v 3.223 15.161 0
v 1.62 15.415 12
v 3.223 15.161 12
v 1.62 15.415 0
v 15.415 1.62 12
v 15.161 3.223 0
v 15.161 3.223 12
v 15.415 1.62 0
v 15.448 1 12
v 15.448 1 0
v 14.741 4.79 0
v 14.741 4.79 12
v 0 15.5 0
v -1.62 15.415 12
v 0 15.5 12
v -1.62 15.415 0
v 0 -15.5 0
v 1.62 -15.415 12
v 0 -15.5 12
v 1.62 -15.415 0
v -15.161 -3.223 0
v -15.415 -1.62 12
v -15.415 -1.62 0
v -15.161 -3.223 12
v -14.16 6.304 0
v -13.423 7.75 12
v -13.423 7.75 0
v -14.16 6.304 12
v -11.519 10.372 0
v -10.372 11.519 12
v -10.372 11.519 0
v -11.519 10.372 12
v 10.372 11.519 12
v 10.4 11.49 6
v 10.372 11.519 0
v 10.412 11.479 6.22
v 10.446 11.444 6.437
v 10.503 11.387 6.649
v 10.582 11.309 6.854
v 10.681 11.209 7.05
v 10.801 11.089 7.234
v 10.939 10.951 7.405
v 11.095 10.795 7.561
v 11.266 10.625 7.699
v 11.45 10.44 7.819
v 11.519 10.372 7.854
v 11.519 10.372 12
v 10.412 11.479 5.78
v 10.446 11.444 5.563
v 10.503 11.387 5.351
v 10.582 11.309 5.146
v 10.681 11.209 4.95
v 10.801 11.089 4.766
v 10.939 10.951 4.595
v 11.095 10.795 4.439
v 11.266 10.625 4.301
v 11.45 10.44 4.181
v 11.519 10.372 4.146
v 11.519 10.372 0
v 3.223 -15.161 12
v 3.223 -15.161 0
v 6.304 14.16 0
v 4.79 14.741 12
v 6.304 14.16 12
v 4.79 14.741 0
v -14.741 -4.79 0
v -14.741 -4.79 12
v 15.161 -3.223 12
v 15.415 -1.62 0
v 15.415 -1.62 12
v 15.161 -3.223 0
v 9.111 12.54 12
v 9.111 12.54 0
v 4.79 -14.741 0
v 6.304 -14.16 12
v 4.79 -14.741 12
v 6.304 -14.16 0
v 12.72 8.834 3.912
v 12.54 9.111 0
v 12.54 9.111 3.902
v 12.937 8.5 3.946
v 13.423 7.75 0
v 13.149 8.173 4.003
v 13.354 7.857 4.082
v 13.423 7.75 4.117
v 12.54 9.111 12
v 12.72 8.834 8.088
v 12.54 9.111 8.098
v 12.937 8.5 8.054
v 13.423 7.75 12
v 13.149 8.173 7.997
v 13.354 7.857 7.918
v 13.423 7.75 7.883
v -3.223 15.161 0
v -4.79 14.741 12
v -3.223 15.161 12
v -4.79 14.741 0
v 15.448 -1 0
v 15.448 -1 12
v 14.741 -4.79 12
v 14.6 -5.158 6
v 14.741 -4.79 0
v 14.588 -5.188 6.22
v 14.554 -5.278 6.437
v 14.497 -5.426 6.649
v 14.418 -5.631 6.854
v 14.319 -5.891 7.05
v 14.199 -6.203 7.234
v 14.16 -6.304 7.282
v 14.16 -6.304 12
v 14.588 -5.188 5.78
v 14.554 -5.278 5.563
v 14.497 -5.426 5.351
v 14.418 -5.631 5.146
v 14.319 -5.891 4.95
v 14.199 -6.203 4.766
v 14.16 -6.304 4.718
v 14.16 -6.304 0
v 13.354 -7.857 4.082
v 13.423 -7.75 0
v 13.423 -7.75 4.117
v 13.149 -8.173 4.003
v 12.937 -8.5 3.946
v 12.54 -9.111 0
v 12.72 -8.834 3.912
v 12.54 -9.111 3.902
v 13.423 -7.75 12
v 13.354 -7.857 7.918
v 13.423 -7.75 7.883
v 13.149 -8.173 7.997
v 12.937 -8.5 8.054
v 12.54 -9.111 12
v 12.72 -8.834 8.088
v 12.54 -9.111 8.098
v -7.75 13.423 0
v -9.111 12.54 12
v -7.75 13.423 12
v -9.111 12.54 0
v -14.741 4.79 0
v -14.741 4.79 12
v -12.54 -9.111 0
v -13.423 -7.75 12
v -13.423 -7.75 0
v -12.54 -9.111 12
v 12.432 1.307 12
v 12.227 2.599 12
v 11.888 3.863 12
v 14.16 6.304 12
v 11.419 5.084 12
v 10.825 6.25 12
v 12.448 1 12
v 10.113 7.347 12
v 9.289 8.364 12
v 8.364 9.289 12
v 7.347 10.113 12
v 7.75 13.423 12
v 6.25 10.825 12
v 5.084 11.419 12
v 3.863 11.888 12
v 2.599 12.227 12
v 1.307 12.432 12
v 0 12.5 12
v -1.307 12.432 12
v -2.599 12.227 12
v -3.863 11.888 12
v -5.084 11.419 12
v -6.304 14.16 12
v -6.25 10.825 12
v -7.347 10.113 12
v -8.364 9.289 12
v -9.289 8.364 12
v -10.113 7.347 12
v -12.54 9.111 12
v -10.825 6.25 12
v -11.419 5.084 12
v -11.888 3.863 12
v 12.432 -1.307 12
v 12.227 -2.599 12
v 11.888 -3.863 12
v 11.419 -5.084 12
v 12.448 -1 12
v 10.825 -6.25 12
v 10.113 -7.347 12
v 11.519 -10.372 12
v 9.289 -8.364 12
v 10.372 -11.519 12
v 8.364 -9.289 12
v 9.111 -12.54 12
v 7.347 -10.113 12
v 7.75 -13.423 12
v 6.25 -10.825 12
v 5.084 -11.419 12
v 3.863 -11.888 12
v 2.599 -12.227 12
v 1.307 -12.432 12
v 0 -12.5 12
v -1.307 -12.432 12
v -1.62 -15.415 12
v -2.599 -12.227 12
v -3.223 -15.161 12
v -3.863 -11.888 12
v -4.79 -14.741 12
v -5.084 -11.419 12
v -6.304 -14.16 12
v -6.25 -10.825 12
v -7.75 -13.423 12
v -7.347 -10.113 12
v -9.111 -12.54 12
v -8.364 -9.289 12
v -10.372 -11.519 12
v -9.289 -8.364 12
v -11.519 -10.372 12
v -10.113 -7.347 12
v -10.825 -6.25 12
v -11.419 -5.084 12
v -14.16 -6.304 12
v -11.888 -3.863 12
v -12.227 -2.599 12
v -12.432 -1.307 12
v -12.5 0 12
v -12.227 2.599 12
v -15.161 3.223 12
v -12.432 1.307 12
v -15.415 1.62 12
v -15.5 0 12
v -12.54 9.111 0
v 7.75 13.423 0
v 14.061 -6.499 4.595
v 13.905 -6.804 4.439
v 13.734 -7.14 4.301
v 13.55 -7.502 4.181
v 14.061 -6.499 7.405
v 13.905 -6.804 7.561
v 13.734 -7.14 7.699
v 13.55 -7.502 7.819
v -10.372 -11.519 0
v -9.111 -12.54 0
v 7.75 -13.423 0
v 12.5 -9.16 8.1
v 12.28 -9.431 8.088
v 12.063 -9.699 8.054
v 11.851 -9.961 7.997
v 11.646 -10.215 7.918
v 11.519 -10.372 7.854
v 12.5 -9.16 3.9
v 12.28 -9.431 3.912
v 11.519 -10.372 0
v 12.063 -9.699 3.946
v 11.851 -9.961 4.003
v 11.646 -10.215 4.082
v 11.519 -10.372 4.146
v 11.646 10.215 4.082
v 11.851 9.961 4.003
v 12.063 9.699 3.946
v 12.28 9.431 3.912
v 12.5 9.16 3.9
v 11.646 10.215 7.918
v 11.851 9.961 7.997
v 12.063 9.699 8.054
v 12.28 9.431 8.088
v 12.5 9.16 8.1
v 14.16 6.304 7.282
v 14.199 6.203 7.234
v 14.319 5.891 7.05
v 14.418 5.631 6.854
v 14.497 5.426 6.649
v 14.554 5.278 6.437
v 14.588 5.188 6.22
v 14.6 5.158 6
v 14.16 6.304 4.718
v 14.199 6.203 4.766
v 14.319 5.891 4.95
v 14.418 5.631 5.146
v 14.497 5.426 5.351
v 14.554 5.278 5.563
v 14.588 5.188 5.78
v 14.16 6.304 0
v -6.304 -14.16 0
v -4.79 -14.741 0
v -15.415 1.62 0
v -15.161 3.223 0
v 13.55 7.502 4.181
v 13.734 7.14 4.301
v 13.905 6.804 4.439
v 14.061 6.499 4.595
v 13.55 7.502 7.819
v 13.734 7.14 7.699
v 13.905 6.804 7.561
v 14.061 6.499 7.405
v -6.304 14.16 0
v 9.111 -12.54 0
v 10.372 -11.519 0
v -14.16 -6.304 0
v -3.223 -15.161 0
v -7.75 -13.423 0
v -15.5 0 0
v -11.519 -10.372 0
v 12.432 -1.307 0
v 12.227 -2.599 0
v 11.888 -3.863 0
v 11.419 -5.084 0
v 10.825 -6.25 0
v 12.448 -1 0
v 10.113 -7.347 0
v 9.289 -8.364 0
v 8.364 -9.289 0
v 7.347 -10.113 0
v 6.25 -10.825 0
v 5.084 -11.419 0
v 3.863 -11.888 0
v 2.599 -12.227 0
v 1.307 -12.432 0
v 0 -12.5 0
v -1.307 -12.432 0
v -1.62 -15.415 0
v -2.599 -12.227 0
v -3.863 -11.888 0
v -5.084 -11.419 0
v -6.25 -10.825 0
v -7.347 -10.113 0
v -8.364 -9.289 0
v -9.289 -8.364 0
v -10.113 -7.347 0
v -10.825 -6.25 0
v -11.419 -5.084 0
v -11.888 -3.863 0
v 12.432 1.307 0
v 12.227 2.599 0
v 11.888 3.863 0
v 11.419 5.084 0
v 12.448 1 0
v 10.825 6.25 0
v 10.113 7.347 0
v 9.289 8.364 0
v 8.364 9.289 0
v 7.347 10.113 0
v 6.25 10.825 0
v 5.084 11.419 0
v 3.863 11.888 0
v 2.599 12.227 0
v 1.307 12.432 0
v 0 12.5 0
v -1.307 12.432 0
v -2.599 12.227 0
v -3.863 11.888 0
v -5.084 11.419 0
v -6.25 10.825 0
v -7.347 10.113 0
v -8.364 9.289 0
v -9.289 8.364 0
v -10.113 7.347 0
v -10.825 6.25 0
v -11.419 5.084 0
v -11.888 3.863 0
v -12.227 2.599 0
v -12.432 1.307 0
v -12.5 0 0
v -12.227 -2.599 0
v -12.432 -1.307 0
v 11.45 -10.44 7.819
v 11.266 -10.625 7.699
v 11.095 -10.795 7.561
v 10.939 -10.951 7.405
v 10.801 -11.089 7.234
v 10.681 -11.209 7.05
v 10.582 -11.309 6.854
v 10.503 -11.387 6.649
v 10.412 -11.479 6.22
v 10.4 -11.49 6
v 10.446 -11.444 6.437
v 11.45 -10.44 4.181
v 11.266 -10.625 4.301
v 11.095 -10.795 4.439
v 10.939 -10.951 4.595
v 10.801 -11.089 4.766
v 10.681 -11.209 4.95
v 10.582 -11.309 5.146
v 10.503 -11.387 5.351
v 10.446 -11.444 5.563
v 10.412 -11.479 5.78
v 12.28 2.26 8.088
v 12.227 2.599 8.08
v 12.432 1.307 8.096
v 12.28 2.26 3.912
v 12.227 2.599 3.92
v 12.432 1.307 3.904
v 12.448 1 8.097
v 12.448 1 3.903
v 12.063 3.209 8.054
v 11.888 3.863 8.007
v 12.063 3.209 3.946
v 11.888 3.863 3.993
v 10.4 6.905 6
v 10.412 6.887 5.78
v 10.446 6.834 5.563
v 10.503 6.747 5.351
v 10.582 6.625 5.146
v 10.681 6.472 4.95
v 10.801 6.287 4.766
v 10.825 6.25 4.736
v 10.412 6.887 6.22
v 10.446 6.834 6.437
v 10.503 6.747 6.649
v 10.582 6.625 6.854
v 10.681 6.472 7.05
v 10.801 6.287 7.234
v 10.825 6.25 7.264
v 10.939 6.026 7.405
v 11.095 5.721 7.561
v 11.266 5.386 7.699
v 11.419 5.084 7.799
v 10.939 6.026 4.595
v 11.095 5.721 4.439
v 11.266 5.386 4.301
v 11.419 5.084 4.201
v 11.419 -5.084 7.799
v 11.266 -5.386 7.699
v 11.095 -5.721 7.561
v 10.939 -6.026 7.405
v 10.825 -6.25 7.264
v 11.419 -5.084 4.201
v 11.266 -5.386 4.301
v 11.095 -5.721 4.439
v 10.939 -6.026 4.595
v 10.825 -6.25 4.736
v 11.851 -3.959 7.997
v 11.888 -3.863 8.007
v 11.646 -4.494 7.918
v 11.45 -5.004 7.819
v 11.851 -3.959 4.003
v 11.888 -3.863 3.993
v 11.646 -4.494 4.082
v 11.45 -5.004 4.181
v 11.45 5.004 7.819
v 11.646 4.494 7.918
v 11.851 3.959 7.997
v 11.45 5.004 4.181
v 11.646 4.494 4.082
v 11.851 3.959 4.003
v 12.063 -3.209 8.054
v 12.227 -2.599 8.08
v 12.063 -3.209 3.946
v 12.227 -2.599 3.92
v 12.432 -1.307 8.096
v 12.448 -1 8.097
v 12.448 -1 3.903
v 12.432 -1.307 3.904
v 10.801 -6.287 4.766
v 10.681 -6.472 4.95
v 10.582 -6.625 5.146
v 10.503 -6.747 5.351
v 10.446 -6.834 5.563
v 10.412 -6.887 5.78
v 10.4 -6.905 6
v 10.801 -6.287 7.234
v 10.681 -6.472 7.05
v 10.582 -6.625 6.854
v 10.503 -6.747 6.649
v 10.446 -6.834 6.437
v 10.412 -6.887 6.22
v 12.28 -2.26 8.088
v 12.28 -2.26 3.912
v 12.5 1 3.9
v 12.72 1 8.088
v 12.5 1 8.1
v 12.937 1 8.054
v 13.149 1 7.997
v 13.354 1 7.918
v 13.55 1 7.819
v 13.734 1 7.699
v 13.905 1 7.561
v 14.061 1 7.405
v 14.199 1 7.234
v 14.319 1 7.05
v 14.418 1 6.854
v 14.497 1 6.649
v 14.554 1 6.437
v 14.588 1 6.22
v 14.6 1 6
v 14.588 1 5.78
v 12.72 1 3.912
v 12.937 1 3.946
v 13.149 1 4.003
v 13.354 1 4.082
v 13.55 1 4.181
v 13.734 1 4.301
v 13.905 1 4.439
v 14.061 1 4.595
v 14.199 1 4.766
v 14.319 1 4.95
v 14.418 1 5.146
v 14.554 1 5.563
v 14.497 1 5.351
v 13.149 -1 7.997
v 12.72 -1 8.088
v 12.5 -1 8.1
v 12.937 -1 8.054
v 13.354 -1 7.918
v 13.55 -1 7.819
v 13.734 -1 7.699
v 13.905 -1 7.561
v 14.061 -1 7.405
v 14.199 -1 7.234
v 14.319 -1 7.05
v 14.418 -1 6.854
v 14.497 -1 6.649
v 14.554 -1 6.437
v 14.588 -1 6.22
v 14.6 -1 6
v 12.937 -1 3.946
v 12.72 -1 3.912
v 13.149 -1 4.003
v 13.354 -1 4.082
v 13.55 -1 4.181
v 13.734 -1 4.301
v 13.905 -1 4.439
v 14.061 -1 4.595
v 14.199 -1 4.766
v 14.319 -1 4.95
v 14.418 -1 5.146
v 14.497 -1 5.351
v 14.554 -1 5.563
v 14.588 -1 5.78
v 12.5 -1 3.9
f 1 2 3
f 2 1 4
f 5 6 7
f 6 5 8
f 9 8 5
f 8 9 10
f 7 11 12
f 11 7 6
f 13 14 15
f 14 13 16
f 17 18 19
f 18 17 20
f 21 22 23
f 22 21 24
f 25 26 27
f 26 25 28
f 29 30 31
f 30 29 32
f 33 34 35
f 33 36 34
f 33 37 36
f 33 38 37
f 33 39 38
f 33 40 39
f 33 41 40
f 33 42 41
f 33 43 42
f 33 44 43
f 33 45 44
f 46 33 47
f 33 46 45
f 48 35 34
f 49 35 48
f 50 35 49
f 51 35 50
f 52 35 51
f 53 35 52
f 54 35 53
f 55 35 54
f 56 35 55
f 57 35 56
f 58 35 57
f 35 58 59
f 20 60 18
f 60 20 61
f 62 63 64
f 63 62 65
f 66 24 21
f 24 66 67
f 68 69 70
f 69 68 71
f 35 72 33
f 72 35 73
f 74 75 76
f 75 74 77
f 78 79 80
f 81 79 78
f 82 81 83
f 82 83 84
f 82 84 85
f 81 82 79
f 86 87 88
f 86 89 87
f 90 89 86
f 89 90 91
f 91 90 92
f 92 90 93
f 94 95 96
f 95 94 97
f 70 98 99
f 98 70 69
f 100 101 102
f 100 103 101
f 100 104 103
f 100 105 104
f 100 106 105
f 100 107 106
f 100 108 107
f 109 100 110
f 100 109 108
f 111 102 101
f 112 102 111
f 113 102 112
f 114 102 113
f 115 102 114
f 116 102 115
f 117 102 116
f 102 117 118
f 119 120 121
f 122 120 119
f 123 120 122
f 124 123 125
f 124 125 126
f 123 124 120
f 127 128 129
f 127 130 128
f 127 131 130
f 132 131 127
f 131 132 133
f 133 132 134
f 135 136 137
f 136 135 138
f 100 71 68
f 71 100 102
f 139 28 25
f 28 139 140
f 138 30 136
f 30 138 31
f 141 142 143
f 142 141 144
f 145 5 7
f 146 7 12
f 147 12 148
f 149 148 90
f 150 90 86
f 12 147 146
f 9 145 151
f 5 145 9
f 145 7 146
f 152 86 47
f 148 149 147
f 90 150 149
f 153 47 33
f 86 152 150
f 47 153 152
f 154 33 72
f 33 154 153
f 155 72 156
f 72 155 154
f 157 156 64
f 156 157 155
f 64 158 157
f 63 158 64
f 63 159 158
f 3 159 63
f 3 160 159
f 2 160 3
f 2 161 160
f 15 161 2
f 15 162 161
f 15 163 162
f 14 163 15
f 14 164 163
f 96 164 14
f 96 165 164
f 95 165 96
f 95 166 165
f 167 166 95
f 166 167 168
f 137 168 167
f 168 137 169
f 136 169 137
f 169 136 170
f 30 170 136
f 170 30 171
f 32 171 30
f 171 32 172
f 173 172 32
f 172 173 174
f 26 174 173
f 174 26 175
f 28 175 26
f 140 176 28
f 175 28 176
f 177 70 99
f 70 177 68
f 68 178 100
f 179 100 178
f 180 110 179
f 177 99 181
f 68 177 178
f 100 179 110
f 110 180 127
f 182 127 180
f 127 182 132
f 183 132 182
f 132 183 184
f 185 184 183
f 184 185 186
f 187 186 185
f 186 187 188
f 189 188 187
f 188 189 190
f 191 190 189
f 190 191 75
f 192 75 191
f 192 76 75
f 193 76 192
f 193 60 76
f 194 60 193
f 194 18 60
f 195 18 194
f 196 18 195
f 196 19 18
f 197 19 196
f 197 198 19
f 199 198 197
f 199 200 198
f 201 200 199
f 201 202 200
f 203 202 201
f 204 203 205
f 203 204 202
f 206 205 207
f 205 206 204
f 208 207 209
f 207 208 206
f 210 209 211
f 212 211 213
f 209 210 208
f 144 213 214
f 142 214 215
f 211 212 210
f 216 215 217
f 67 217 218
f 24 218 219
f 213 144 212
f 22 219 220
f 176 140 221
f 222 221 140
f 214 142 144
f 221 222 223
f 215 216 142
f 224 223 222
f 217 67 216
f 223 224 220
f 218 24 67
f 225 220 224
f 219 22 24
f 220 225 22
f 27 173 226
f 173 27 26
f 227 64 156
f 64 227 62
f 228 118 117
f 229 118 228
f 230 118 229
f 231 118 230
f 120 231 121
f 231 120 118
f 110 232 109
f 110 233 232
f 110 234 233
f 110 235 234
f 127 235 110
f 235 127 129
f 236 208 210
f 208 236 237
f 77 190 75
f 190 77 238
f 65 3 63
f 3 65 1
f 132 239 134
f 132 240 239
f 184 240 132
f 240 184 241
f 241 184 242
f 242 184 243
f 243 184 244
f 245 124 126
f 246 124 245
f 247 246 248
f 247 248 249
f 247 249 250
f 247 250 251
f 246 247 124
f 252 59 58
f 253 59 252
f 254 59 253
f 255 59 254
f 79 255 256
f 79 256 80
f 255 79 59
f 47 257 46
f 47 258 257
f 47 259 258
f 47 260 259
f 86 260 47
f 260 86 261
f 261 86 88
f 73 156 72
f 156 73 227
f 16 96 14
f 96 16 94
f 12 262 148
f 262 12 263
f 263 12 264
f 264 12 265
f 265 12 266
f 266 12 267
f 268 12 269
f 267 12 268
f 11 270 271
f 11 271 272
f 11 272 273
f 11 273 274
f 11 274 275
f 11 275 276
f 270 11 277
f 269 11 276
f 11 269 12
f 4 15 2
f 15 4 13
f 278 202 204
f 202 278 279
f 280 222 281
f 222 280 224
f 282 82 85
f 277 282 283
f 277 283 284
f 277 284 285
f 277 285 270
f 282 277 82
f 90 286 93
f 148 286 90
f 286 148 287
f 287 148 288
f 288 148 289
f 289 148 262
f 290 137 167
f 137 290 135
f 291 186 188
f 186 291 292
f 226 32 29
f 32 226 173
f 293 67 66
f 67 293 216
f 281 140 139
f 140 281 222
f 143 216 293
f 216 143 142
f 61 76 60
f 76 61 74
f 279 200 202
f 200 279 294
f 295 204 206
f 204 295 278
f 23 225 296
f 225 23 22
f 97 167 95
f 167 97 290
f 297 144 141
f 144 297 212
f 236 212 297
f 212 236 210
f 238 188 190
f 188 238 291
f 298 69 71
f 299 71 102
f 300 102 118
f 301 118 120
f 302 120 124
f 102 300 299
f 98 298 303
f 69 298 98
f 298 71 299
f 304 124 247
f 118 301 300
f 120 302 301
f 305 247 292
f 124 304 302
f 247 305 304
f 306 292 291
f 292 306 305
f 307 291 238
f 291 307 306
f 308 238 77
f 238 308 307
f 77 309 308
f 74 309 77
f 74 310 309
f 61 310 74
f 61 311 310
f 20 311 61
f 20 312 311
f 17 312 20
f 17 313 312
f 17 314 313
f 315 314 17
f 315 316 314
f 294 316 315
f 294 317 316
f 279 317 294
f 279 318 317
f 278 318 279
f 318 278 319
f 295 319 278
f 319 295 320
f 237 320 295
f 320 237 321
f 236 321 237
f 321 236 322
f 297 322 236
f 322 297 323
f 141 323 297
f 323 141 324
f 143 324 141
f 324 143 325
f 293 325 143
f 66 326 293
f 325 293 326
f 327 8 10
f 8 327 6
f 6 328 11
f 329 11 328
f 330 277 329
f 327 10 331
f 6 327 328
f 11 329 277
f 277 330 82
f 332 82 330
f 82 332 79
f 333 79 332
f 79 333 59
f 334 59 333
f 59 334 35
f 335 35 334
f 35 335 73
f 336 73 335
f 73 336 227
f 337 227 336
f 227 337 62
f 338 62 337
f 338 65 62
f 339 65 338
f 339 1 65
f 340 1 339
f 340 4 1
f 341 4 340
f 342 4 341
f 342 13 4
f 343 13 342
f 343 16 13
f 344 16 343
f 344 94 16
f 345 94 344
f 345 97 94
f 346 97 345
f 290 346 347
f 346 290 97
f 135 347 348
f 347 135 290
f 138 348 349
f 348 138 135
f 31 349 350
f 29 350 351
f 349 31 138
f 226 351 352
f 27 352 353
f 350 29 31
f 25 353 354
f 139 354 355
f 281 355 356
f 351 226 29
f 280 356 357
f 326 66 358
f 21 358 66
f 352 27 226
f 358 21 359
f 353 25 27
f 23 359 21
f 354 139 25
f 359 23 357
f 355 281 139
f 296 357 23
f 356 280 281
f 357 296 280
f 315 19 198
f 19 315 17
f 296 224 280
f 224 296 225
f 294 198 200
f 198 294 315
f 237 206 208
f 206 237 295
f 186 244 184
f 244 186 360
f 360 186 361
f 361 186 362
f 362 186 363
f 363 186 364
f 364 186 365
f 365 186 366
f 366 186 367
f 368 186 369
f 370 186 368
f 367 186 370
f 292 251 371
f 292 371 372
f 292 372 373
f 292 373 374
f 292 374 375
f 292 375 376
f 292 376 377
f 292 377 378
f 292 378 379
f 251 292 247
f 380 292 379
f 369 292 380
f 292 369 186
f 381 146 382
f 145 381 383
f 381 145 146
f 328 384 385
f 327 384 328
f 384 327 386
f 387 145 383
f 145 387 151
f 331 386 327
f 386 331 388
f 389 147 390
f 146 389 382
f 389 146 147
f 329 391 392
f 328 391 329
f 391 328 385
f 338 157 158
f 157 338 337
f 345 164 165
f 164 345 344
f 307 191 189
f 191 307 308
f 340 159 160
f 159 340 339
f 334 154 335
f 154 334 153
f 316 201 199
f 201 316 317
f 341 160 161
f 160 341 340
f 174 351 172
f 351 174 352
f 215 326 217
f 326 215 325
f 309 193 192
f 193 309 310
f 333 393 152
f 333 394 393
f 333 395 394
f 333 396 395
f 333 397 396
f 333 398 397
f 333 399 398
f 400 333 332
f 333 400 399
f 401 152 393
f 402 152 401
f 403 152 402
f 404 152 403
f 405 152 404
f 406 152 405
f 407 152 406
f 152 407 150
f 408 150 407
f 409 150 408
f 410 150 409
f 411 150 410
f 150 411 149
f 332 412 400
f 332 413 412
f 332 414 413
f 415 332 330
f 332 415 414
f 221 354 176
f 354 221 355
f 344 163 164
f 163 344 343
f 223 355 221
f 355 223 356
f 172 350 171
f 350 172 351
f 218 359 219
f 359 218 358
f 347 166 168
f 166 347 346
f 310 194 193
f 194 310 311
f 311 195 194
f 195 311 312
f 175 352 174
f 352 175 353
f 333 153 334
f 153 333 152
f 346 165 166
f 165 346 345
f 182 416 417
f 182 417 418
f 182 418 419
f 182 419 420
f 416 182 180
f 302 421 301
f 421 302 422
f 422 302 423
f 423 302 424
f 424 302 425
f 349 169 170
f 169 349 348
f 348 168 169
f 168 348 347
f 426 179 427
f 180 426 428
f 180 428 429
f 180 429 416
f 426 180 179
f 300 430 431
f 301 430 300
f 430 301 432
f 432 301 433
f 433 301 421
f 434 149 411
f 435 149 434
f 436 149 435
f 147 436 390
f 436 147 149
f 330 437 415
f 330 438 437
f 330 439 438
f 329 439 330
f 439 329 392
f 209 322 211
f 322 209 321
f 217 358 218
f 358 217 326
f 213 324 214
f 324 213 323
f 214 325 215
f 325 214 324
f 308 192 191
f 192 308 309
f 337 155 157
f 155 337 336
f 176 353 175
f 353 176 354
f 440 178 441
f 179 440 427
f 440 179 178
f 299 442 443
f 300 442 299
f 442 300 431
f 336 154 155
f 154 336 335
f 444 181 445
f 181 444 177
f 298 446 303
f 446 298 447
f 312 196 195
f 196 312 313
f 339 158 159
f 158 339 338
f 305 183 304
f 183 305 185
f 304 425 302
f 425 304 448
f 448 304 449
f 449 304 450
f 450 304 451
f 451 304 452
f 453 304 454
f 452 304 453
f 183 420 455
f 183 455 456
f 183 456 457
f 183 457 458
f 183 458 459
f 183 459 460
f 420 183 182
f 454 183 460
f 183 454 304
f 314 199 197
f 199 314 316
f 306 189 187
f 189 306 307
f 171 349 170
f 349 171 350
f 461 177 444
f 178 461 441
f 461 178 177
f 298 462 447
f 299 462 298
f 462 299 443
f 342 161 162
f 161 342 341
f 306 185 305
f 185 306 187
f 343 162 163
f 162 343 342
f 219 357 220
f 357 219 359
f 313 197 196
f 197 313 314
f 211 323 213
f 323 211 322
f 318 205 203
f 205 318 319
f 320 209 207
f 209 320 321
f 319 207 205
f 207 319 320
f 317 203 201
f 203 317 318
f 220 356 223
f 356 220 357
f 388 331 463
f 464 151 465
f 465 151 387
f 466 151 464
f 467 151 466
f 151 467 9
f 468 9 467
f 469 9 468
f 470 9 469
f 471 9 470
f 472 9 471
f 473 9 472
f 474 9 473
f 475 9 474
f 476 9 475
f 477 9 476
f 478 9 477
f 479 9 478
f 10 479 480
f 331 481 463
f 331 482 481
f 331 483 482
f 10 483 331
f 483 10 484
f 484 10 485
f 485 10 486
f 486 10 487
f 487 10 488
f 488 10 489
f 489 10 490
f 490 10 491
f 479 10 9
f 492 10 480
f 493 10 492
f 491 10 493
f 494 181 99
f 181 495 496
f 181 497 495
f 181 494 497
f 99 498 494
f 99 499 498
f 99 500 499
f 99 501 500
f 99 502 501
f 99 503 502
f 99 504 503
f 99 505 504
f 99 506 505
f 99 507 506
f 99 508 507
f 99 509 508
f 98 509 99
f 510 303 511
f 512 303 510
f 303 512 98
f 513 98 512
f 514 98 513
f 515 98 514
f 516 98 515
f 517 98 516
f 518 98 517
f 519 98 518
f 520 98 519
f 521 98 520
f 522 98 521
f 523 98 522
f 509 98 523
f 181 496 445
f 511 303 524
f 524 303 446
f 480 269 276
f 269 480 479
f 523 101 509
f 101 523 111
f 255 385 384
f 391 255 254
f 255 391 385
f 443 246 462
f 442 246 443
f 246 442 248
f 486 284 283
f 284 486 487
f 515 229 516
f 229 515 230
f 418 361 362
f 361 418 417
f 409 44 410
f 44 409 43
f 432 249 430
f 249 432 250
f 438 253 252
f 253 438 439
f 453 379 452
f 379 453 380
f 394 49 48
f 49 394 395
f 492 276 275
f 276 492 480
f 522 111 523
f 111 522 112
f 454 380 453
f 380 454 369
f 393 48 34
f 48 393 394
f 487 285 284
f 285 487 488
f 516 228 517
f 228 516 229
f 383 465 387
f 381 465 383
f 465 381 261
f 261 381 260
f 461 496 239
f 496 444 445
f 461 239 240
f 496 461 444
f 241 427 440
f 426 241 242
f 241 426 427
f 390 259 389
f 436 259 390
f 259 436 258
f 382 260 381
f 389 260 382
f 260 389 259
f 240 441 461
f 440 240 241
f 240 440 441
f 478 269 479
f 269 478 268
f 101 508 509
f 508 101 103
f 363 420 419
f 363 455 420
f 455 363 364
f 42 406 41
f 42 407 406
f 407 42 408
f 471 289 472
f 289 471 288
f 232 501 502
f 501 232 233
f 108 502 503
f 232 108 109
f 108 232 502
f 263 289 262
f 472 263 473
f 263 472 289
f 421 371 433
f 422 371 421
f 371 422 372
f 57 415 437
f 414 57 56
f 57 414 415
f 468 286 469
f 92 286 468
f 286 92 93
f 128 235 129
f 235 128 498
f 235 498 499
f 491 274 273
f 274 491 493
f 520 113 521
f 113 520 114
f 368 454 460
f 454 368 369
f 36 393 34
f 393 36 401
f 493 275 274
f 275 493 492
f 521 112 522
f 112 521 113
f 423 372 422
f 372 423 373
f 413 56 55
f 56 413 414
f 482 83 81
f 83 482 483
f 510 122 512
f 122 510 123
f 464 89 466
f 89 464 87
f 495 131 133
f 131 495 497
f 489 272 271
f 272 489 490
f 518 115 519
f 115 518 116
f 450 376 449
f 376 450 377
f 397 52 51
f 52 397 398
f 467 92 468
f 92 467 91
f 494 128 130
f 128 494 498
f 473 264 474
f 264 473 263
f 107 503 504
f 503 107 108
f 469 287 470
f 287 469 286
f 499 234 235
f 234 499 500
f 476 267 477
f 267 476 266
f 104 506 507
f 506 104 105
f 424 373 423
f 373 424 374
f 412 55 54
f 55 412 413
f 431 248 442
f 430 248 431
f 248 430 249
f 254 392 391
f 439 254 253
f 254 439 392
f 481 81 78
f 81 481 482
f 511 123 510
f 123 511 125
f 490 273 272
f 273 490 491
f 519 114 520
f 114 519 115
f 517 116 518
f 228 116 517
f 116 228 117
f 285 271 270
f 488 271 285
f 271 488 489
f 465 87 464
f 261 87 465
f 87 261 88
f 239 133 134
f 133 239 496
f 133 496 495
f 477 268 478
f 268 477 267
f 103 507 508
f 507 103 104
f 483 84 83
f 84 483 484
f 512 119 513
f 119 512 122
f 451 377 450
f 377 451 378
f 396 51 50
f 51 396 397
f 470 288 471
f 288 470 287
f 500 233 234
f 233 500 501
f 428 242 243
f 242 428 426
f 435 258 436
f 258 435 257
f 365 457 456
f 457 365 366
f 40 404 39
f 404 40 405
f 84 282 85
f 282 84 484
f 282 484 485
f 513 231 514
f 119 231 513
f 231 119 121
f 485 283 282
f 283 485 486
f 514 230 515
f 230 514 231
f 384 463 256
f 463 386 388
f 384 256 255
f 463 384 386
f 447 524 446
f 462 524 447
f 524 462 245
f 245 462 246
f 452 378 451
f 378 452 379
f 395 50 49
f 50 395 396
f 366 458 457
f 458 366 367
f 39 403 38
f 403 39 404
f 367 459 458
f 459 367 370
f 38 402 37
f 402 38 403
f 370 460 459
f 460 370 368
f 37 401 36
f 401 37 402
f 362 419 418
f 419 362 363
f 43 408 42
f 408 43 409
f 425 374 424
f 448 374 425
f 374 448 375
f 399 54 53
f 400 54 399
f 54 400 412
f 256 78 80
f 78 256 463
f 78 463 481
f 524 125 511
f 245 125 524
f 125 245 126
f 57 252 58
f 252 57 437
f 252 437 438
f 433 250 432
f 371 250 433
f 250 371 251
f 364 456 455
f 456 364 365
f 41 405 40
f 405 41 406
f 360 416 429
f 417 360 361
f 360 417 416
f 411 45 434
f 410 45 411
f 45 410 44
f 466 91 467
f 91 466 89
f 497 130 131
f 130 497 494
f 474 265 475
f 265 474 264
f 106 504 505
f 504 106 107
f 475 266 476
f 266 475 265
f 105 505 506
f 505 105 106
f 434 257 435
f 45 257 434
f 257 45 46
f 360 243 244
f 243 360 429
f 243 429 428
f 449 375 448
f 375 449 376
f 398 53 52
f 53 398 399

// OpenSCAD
// C-style pipe clamp.
$fn = 60;
eps = 0.02;
pipe_d = 25;
wall = 3;
outer_d = pipe_d+2*wall;
width = 12;
difference() {
    cylinder(d=outer_d,h=width);
    translate([0,0,-eps]) cylinder(d=pipe_d,h=width+2*eps);
    translate([0,-1,-eps]) cube([outer_d/2+eps,2,width+2*eps]);
    translate([outer_d/2-3,-outer_d/2-eps,width/2]) rotate([-90,0,0]) cylinder(d=4.2,h=outer_d+2*eps);
}
